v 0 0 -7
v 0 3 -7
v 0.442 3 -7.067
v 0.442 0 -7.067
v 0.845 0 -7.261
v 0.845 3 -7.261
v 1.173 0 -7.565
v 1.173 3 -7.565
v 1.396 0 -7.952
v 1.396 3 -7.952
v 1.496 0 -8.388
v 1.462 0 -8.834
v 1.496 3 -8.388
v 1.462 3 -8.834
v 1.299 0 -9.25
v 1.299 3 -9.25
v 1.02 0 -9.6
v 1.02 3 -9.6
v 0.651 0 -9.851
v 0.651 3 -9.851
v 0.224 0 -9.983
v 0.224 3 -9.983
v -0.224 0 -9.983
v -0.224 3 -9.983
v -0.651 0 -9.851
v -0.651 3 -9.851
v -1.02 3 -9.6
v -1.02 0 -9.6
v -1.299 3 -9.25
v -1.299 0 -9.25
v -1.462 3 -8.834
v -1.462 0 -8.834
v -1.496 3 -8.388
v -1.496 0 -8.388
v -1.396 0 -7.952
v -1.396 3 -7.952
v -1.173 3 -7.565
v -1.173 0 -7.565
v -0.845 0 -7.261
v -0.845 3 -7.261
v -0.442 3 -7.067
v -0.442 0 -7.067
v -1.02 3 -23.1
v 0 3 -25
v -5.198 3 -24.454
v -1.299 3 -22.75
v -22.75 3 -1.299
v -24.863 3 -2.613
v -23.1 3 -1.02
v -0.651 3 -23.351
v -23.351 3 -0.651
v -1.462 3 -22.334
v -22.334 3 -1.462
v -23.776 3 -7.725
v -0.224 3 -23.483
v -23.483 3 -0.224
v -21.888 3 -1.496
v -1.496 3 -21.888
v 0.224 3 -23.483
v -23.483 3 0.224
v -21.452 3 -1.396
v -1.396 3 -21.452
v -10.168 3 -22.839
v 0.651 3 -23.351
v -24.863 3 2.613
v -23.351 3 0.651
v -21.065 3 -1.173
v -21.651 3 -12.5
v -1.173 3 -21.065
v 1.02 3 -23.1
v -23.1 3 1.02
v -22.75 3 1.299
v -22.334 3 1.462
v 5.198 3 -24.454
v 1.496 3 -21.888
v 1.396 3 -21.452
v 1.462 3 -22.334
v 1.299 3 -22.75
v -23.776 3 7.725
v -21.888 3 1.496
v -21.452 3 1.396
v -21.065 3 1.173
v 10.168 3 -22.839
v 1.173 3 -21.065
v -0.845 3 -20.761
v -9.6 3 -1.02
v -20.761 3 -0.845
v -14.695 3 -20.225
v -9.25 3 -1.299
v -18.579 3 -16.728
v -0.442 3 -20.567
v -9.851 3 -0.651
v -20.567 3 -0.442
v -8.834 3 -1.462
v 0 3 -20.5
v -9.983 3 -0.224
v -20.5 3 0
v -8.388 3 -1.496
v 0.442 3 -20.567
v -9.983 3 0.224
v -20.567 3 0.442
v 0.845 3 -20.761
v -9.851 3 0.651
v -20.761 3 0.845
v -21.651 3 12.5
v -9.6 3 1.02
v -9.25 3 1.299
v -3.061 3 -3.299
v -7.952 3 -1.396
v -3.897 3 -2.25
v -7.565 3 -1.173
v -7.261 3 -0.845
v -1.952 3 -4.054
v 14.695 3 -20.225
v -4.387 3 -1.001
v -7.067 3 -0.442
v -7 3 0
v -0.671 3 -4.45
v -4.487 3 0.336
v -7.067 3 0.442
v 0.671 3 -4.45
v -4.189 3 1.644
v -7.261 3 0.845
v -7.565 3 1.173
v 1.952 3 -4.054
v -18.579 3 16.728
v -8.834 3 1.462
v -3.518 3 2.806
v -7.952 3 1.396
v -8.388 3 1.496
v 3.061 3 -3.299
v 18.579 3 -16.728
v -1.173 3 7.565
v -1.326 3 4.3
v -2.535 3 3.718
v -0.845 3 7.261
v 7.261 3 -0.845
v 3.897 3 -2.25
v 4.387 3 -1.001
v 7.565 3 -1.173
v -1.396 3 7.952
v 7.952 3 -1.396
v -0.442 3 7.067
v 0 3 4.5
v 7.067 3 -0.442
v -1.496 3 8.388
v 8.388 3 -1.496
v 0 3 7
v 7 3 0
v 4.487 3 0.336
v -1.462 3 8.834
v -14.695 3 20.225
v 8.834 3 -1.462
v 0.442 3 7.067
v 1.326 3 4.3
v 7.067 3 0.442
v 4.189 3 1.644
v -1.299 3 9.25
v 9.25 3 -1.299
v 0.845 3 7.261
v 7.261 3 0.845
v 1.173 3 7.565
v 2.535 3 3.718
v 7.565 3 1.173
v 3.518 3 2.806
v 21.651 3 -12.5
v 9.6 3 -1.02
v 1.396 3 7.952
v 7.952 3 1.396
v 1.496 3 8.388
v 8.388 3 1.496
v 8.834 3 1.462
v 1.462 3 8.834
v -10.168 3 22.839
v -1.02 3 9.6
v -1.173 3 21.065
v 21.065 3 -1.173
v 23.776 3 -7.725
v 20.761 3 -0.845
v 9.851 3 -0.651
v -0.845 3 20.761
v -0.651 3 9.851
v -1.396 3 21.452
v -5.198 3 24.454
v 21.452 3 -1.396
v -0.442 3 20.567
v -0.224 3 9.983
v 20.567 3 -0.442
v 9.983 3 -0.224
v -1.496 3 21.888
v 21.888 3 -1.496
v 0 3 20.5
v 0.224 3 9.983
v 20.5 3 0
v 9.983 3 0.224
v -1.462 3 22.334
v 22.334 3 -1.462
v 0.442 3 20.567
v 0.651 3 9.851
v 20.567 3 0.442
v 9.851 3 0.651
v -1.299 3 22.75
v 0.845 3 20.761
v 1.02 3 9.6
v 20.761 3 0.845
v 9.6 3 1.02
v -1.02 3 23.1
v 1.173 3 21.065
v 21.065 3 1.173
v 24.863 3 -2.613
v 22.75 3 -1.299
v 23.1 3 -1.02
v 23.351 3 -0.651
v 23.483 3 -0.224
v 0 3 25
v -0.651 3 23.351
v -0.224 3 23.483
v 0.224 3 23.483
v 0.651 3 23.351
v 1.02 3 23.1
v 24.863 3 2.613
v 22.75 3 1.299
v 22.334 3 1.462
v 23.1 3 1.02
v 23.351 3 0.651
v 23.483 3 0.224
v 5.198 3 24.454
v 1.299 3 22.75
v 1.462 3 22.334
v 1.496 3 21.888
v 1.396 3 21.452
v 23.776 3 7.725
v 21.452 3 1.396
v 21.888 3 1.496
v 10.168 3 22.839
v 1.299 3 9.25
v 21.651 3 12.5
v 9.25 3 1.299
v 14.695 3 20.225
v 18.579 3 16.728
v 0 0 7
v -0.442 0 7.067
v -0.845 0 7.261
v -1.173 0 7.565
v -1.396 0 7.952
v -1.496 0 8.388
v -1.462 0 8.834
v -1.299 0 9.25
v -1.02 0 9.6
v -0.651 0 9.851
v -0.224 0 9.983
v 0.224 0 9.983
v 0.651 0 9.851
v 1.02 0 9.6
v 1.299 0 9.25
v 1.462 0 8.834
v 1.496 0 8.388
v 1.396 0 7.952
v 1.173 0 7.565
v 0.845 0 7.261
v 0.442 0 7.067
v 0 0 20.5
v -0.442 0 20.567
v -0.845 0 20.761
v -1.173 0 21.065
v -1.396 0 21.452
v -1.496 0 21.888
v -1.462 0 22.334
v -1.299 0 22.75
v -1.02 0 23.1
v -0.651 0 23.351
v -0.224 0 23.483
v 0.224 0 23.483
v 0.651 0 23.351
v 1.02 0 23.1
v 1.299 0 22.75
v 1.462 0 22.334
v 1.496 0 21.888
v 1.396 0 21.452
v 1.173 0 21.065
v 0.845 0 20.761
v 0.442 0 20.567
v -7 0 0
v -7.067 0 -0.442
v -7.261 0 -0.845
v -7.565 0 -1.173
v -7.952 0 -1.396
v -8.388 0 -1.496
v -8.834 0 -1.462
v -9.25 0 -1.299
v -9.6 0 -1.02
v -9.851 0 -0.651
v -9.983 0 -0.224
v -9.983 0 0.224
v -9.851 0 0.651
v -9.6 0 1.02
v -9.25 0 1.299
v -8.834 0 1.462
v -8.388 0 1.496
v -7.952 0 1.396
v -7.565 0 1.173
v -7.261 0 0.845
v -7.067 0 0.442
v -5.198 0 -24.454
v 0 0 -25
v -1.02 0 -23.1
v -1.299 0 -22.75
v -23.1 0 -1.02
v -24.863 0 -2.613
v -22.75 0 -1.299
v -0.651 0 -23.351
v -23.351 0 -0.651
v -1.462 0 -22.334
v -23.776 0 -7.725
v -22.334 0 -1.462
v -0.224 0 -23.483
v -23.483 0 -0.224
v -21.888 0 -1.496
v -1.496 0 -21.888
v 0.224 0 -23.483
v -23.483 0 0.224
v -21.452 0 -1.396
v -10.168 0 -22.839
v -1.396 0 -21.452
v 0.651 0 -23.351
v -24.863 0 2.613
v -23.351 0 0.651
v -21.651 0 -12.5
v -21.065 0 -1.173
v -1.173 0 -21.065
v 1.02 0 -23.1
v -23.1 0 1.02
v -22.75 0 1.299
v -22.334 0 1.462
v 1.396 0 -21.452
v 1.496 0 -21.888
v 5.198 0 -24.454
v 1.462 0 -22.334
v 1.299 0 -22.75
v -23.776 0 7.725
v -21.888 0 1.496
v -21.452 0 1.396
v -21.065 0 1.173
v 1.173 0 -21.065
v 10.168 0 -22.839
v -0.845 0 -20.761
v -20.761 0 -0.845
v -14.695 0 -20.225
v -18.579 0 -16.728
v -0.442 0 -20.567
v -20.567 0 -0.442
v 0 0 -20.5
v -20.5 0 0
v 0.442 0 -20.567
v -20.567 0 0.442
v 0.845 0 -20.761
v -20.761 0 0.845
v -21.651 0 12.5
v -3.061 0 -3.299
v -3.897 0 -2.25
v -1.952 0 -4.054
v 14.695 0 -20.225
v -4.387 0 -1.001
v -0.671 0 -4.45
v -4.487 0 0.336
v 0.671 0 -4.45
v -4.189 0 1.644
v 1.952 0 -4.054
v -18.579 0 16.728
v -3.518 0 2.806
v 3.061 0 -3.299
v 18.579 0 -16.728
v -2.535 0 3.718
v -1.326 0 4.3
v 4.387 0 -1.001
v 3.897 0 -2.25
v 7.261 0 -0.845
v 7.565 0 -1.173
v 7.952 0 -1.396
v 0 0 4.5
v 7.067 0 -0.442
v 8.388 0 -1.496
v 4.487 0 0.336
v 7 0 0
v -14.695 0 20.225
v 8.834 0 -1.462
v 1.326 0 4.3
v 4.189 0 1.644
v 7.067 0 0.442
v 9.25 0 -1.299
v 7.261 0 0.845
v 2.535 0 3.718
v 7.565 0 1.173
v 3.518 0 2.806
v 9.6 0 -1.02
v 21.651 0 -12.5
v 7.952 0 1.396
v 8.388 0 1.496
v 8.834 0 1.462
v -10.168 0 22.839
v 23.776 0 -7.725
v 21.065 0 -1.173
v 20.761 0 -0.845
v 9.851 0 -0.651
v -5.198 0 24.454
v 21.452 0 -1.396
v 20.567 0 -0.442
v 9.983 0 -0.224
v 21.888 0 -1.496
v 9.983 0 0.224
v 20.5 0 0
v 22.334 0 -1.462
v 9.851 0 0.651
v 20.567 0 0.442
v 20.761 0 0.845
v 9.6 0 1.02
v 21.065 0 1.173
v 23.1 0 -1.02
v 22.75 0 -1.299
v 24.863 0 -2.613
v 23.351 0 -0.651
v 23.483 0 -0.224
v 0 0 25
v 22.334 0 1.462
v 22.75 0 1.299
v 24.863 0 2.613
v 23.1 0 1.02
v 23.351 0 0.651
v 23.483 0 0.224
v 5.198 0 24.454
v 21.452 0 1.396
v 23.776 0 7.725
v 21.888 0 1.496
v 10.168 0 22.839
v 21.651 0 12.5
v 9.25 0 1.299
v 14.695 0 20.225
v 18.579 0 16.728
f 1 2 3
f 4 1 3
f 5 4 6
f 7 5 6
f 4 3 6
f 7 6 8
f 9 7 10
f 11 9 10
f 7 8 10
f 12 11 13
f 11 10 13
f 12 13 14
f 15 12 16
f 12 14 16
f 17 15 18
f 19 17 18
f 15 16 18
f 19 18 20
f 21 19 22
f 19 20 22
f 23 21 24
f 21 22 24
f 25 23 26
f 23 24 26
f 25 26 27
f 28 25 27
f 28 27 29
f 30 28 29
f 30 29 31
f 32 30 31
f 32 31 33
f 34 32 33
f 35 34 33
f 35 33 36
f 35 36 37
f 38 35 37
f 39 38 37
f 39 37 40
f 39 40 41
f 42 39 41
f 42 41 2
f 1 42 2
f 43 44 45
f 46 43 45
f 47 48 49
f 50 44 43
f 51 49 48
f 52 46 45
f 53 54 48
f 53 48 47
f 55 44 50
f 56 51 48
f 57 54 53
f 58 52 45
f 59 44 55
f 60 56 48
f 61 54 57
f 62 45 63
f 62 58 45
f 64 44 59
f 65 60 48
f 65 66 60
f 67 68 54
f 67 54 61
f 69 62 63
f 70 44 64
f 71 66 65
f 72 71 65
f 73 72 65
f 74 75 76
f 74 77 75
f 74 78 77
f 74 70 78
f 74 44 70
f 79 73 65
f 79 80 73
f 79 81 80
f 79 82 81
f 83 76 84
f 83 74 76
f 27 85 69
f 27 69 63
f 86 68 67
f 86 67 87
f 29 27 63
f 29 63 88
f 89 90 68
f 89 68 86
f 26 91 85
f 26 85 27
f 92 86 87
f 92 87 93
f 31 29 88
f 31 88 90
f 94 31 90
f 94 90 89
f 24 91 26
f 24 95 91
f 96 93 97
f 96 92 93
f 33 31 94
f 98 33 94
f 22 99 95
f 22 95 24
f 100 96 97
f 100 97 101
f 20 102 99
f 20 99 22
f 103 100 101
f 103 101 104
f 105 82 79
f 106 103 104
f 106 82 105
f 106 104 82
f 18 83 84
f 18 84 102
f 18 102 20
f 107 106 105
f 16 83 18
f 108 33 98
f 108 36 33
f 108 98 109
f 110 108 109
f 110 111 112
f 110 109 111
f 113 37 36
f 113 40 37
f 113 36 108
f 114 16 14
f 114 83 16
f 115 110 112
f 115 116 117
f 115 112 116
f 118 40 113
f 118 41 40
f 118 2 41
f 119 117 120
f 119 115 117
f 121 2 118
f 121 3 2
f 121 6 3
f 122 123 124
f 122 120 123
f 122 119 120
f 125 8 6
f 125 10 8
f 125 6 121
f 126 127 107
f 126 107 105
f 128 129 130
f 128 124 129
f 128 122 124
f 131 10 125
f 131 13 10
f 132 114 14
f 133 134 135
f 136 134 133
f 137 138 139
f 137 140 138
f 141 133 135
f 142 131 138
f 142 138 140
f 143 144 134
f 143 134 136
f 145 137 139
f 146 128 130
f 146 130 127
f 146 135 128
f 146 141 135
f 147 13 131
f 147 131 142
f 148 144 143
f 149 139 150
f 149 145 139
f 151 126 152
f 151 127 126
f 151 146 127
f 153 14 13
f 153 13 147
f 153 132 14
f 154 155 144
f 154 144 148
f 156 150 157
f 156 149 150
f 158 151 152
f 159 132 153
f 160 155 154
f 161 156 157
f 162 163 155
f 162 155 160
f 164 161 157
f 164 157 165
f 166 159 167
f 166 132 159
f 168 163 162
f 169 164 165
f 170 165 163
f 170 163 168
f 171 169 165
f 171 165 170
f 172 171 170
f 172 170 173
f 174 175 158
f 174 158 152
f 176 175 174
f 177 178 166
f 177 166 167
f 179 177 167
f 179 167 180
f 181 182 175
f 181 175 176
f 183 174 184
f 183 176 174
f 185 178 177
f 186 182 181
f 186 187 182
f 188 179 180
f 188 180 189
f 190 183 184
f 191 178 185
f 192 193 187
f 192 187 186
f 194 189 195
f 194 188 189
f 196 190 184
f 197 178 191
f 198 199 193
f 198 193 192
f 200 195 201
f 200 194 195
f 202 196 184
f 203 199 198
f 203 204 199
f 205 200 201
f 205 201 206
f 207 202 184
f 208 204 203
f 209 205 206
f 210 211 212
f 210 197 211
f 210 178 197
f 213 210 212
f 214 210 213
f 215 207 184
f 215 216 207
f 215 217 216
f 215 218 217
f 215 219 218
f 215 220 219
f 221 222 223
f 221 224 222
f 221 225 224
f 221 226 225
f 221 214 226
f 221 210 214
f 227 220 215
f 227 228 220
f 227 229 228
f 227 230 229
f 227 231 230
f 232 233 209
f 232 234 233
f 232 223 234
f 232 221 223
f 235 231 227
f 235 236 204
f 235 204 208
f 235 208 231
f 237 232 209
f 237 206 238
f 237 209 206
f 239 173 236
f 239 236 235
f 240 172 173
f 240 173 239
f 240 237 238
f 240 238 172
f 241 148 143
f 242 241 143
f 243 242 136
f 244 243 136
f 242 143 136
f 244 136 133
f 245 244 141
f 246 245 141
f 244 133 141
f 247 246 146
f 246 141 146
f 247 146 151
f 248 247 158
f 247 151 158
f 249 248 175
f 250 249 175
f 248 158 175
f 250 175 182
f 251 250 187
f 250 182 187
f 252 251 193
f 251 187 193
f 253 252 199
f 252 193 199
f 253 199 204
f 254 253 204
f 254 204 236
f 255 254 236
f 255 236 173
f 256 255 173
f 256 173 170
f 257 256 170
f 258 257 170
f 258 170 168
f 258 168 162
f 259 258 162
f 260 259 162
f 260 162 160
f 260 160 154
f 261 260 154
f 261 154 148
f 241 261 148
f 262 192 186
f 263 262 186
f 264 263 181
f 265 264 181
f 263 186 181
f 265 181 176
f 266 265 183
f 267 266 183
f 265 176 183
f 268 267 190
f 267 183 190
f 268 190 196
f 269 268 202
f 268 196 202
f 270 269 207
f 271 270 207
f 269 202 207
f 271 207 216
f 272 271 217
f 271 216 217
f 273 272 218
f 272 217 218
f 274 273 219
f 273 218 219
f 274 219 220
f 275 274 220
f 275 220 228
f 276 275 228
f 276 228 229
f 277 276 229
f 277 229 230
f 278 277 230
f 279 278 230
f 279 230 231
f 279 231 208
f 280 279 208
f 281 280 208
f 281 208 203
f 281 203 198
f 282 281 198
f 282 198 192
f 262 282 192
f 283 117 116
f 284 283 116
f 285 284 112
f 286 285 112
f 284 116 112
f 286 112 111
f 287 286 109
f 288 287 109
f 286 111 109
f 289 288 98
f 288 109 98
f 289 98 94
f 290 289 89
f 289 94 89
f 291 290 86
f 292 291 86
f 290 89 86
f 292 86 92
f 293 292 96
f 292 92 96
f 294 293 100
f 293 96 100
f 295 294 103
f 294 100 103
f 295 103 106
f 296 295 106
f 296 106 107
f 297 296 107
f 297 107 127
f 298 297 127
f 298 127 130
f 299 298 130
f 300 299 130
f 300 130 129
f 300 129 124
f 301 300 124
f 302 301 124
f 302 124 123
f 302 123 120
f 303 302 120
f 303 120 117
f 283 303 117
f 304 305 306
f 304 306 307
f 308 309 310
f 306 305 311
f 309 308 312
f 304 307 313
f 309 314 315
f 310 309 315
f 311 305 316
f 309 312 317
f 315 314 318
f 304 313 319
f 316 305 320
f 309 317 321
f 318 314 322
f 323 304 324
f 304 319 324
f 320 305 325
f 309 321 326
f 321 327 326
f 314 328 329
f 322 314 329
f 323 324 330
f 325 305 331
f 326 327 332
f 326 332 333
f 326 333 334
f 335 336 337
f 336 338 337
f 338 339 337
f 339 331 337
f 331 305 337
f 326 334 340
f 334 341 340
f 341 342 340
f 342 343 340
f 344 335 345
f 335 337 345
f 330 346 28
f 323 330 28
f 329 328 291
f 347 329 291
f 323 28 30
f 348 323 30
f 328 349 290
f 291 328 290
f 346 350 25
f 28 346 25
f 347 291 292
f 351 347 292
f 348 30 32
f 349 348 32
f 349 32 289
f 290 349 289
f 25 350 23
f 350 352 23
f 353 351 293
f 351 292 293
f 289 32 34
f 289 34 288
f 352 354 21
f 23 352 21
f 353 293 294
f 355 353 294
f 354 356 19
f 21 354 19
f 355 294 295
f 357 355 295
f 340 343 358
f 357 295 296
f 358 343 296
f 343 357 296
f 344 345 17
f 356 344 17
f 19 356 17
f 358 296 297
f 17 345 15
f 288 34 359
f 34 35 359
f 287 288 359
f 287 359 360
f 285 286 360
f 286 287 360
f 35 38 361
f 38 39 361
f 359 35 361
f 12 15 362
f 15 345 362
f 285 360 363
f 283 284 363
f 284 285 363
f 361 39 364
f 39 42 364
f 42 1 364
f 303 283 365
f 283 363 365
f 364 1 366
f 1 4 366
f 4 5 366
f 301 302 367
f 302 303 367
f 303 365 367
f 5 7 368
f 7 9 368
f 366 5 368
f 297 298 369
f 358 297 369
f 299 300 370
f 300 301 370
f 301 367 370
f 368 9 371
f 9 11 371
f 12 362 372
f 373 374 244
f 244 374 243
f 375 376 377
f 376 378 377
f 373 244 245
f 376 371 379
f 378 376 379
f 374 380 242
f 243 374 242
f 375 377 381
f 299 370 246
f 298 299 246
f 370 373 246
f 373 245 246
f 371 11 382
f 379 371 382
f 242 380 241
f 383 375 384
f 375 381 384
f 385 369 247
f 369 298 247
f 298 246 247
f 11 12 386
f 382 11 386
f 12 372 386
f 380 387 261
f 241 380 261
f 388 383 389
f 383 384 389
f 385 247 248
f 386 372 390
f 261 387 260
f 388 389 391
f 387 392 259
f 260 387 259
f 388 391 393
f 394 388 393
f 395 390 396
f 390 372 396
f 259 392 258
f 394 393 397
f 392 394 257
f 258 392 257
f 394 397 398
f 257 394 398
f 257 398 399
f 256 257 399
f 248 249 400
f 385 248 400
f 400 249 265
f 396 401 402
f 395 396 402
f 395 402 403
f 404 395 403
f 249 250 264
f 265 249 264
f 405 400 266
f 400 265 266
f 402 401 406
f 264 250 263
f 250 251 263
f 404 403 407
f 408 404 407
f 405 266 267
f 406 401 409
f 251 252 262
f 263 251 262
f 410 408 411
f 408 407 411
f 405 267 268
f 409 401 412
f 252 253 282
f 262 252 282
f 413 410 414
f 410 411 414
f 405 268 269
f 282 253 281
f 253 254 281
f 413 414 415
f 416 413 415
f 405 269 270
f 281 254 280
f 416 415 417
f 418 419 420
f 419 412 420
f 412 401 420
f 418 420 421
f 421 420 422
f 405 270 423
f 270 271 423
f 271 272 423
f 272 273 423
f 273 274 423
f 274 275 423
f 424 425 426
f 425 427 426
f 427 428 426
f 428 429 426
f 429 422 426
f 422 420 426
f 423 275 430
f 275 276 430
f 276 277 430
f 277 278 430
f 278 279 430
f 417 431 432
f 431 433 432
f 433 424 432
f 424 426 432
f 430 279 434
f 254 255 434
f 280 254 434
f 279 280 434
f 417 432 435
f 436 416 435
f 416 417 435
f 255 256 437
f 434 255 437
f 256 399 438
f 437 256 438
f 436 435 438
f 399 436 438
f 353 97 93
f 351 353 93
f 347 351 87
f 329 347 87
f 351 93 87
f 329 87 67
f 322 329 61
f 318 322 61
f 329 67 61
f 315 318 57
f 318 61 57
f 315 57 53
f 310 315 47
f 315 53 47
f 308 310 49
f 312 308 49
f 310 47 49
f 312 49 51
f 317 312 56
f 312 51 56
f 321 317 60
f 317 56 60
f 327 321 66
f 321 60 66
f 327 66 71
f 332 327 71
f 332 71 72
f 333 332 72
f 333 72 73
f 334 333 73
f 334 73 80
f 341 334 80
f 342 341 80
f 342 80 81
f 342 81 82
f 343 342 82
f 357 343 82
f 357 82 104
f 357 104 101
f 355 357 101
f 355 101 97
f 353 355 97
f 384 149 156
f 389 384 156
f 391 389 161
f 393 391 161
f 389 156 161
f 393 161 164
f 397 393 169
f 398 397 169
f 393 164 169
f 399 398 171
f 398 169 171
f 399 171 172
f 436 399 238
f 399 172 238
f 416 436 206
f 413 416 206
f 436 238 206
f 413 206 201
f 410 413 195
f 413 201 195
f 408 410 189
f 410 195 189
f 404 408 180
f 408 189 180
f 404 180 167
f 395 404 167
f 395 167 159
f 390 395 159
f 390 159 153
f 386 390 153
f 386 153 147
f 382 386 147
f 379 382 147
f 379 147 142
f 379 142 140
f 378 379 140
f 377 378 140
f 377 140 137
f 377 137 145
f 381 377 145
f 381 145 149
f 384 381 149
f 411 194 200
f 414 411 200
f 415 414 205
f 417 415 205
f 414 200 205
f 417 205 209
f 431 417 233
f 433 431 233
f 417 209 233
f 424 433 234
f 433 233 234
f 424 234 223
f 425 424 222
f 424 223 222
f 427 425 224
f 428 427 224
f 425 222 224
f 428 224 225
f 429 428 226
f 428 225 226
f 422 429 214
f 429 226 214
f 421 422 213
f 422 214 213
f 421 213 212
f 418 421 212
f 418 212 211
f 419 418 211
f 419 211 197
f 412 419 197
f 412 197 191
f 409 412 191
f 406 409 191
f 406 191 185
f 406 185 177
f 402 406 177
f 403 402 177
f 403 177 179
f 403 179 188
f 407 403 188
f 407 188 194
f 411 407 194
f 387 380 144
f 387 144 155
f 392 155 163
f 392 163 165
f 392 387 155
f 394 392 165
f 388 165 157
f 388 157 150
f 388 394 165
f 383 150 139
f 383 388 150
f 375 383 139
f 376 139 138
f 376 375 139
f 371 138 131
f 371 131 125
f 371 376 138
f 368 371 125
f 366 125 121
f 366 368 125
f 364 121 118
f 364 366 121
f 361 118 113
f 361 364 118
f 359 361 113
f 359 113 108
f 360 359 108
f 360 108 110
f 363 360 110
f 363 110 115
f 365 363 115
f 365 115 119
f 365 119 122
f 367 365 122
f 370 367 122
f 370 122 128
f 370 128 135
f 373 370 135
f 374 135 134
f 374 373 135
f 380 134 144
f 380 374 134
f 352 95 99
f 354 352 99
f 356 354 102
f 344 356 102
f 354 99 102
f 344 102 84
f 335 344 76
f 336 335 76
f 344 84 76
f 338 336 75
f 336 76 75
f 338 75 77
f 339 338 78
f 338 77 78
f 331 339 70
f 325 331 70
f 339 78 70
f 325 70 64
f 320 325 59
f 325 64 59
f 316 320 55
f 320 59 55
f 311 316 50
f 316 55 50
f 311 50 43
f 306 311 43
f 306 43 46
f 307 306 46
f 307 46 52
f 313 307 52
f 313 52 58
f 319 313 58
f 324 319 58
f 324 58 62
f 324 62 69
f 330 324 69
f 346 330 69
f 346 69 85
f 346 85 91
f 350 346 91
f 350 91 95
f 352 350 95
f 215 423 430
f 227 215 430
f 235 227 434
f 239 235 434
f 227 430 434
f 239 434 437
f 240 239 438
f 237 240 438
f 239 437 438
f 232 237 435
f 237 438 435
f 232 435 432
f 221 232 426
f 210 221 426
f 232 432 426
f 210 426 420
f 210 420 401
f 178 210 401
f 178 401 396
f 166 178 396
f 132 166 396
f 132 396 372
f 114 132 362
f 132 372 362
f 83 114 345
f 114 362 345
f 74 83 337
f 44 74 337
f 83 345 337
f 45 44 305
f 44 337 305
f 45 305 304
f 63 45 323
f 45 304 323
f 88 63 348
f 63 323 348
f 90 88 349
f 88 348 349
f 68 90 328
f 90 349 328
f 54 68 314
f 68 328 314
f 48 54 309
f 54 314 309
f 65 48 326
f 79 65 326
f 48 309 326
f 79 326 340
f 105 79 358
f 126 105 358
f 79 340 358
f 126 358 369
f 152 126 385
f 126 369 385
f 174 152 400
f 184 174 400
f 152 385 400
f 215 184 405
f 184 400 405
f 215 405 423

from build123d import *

# Parameters (mm, degrees)
SKETCH1_R           = 25
SKETCH1_R_2         = 4.5
BOSS_EXTRUDE1_DEPTH = 3
SKETCH2_R           = 1.5
CUT_EXTRUDE1_DEPTH  = 36.482389998
CIRPATTERN1_COUNT   = 4
SKETCH3_R           = 1.5
CUT_EXTRUDE3_DEPTH  = 36.482389998
CIRPATTERN2_COUNT   = 4


with BuildPart() as part:
    # Sketch1 → Boss-Extrude1 (new body)
    with BuildSketch(Plane(origin=(0, 0, 0), x_dir=(1, 0, 0), z_dir=(0, 1, 0))):
        with Locations(Location((0, 0, 0), (0, 0, 270))):
            Circle(SKETCH1_R)
        with Locations(Location((0, 0, 0), (0, 0, 270))):
            Circle(SKETCH1_R_2, mode=Mode.SUBTRACT)
    extrude(amount=BOSS_EXTRUDE1_DEPTH)

    # Sketch2 → Cut-Extrude1 (cut, through all)
    with BuildSketch(Plane(origin=(0, 3, 0), x_dir=(1, 0, 0), z_dir=(0, 1, 0))):
        with Locations(Location((0, 8.5, 0), (0, 0, 270))):
            Circle(SKETCH2_R)
    cut_extrude1 = extrude(amount=-CUT_EXTRUDE1_DEPTH, mode=Mode.SUBTRACT)

    # CirPattern1: Cut-Extrude1 ×4 about axis
    cirpattern1_axis = Axis((0, 0, 0), (0, 1, 0))
    for i in range(1, CIRPATTERN1_COUNT):
        add(cut_extrude1.rotate(cirpattern1_axis, i * 360 / CIRPATTERN1_COUNT), mode=Mode.SUBTRACT)

    # Sketch3 → Cut-Extrude3 (cut, through all)
    with BuildSketch(Plane(origin=(0, 3, 0), x_dir=(1, 0, 0), z_dir=(0, 1, 0))):
        with Locations(Location((0, 22, 0), (0, 0, 270))):
            Circle(SKETCH3_R)
    cut_extrude3 = extrude(amount=-CUT_EXTRUDE3_DEPTH, mode=Mode.SUBTRACT)

    # CirPattern2: Cut-Extrude3 ×4 about axis
    cirpattern2_axis = Axis((0, 0, 0), (0, 1, 0))
    for i in range(1, CIRPATTERN2_COUNT):
        add(cut_extrude3.rotate(cirpattern2_axis, i * 360 / CIRPATTERN2_COUNT), mode=Mode.SUBTRACT)


solid = part.part
